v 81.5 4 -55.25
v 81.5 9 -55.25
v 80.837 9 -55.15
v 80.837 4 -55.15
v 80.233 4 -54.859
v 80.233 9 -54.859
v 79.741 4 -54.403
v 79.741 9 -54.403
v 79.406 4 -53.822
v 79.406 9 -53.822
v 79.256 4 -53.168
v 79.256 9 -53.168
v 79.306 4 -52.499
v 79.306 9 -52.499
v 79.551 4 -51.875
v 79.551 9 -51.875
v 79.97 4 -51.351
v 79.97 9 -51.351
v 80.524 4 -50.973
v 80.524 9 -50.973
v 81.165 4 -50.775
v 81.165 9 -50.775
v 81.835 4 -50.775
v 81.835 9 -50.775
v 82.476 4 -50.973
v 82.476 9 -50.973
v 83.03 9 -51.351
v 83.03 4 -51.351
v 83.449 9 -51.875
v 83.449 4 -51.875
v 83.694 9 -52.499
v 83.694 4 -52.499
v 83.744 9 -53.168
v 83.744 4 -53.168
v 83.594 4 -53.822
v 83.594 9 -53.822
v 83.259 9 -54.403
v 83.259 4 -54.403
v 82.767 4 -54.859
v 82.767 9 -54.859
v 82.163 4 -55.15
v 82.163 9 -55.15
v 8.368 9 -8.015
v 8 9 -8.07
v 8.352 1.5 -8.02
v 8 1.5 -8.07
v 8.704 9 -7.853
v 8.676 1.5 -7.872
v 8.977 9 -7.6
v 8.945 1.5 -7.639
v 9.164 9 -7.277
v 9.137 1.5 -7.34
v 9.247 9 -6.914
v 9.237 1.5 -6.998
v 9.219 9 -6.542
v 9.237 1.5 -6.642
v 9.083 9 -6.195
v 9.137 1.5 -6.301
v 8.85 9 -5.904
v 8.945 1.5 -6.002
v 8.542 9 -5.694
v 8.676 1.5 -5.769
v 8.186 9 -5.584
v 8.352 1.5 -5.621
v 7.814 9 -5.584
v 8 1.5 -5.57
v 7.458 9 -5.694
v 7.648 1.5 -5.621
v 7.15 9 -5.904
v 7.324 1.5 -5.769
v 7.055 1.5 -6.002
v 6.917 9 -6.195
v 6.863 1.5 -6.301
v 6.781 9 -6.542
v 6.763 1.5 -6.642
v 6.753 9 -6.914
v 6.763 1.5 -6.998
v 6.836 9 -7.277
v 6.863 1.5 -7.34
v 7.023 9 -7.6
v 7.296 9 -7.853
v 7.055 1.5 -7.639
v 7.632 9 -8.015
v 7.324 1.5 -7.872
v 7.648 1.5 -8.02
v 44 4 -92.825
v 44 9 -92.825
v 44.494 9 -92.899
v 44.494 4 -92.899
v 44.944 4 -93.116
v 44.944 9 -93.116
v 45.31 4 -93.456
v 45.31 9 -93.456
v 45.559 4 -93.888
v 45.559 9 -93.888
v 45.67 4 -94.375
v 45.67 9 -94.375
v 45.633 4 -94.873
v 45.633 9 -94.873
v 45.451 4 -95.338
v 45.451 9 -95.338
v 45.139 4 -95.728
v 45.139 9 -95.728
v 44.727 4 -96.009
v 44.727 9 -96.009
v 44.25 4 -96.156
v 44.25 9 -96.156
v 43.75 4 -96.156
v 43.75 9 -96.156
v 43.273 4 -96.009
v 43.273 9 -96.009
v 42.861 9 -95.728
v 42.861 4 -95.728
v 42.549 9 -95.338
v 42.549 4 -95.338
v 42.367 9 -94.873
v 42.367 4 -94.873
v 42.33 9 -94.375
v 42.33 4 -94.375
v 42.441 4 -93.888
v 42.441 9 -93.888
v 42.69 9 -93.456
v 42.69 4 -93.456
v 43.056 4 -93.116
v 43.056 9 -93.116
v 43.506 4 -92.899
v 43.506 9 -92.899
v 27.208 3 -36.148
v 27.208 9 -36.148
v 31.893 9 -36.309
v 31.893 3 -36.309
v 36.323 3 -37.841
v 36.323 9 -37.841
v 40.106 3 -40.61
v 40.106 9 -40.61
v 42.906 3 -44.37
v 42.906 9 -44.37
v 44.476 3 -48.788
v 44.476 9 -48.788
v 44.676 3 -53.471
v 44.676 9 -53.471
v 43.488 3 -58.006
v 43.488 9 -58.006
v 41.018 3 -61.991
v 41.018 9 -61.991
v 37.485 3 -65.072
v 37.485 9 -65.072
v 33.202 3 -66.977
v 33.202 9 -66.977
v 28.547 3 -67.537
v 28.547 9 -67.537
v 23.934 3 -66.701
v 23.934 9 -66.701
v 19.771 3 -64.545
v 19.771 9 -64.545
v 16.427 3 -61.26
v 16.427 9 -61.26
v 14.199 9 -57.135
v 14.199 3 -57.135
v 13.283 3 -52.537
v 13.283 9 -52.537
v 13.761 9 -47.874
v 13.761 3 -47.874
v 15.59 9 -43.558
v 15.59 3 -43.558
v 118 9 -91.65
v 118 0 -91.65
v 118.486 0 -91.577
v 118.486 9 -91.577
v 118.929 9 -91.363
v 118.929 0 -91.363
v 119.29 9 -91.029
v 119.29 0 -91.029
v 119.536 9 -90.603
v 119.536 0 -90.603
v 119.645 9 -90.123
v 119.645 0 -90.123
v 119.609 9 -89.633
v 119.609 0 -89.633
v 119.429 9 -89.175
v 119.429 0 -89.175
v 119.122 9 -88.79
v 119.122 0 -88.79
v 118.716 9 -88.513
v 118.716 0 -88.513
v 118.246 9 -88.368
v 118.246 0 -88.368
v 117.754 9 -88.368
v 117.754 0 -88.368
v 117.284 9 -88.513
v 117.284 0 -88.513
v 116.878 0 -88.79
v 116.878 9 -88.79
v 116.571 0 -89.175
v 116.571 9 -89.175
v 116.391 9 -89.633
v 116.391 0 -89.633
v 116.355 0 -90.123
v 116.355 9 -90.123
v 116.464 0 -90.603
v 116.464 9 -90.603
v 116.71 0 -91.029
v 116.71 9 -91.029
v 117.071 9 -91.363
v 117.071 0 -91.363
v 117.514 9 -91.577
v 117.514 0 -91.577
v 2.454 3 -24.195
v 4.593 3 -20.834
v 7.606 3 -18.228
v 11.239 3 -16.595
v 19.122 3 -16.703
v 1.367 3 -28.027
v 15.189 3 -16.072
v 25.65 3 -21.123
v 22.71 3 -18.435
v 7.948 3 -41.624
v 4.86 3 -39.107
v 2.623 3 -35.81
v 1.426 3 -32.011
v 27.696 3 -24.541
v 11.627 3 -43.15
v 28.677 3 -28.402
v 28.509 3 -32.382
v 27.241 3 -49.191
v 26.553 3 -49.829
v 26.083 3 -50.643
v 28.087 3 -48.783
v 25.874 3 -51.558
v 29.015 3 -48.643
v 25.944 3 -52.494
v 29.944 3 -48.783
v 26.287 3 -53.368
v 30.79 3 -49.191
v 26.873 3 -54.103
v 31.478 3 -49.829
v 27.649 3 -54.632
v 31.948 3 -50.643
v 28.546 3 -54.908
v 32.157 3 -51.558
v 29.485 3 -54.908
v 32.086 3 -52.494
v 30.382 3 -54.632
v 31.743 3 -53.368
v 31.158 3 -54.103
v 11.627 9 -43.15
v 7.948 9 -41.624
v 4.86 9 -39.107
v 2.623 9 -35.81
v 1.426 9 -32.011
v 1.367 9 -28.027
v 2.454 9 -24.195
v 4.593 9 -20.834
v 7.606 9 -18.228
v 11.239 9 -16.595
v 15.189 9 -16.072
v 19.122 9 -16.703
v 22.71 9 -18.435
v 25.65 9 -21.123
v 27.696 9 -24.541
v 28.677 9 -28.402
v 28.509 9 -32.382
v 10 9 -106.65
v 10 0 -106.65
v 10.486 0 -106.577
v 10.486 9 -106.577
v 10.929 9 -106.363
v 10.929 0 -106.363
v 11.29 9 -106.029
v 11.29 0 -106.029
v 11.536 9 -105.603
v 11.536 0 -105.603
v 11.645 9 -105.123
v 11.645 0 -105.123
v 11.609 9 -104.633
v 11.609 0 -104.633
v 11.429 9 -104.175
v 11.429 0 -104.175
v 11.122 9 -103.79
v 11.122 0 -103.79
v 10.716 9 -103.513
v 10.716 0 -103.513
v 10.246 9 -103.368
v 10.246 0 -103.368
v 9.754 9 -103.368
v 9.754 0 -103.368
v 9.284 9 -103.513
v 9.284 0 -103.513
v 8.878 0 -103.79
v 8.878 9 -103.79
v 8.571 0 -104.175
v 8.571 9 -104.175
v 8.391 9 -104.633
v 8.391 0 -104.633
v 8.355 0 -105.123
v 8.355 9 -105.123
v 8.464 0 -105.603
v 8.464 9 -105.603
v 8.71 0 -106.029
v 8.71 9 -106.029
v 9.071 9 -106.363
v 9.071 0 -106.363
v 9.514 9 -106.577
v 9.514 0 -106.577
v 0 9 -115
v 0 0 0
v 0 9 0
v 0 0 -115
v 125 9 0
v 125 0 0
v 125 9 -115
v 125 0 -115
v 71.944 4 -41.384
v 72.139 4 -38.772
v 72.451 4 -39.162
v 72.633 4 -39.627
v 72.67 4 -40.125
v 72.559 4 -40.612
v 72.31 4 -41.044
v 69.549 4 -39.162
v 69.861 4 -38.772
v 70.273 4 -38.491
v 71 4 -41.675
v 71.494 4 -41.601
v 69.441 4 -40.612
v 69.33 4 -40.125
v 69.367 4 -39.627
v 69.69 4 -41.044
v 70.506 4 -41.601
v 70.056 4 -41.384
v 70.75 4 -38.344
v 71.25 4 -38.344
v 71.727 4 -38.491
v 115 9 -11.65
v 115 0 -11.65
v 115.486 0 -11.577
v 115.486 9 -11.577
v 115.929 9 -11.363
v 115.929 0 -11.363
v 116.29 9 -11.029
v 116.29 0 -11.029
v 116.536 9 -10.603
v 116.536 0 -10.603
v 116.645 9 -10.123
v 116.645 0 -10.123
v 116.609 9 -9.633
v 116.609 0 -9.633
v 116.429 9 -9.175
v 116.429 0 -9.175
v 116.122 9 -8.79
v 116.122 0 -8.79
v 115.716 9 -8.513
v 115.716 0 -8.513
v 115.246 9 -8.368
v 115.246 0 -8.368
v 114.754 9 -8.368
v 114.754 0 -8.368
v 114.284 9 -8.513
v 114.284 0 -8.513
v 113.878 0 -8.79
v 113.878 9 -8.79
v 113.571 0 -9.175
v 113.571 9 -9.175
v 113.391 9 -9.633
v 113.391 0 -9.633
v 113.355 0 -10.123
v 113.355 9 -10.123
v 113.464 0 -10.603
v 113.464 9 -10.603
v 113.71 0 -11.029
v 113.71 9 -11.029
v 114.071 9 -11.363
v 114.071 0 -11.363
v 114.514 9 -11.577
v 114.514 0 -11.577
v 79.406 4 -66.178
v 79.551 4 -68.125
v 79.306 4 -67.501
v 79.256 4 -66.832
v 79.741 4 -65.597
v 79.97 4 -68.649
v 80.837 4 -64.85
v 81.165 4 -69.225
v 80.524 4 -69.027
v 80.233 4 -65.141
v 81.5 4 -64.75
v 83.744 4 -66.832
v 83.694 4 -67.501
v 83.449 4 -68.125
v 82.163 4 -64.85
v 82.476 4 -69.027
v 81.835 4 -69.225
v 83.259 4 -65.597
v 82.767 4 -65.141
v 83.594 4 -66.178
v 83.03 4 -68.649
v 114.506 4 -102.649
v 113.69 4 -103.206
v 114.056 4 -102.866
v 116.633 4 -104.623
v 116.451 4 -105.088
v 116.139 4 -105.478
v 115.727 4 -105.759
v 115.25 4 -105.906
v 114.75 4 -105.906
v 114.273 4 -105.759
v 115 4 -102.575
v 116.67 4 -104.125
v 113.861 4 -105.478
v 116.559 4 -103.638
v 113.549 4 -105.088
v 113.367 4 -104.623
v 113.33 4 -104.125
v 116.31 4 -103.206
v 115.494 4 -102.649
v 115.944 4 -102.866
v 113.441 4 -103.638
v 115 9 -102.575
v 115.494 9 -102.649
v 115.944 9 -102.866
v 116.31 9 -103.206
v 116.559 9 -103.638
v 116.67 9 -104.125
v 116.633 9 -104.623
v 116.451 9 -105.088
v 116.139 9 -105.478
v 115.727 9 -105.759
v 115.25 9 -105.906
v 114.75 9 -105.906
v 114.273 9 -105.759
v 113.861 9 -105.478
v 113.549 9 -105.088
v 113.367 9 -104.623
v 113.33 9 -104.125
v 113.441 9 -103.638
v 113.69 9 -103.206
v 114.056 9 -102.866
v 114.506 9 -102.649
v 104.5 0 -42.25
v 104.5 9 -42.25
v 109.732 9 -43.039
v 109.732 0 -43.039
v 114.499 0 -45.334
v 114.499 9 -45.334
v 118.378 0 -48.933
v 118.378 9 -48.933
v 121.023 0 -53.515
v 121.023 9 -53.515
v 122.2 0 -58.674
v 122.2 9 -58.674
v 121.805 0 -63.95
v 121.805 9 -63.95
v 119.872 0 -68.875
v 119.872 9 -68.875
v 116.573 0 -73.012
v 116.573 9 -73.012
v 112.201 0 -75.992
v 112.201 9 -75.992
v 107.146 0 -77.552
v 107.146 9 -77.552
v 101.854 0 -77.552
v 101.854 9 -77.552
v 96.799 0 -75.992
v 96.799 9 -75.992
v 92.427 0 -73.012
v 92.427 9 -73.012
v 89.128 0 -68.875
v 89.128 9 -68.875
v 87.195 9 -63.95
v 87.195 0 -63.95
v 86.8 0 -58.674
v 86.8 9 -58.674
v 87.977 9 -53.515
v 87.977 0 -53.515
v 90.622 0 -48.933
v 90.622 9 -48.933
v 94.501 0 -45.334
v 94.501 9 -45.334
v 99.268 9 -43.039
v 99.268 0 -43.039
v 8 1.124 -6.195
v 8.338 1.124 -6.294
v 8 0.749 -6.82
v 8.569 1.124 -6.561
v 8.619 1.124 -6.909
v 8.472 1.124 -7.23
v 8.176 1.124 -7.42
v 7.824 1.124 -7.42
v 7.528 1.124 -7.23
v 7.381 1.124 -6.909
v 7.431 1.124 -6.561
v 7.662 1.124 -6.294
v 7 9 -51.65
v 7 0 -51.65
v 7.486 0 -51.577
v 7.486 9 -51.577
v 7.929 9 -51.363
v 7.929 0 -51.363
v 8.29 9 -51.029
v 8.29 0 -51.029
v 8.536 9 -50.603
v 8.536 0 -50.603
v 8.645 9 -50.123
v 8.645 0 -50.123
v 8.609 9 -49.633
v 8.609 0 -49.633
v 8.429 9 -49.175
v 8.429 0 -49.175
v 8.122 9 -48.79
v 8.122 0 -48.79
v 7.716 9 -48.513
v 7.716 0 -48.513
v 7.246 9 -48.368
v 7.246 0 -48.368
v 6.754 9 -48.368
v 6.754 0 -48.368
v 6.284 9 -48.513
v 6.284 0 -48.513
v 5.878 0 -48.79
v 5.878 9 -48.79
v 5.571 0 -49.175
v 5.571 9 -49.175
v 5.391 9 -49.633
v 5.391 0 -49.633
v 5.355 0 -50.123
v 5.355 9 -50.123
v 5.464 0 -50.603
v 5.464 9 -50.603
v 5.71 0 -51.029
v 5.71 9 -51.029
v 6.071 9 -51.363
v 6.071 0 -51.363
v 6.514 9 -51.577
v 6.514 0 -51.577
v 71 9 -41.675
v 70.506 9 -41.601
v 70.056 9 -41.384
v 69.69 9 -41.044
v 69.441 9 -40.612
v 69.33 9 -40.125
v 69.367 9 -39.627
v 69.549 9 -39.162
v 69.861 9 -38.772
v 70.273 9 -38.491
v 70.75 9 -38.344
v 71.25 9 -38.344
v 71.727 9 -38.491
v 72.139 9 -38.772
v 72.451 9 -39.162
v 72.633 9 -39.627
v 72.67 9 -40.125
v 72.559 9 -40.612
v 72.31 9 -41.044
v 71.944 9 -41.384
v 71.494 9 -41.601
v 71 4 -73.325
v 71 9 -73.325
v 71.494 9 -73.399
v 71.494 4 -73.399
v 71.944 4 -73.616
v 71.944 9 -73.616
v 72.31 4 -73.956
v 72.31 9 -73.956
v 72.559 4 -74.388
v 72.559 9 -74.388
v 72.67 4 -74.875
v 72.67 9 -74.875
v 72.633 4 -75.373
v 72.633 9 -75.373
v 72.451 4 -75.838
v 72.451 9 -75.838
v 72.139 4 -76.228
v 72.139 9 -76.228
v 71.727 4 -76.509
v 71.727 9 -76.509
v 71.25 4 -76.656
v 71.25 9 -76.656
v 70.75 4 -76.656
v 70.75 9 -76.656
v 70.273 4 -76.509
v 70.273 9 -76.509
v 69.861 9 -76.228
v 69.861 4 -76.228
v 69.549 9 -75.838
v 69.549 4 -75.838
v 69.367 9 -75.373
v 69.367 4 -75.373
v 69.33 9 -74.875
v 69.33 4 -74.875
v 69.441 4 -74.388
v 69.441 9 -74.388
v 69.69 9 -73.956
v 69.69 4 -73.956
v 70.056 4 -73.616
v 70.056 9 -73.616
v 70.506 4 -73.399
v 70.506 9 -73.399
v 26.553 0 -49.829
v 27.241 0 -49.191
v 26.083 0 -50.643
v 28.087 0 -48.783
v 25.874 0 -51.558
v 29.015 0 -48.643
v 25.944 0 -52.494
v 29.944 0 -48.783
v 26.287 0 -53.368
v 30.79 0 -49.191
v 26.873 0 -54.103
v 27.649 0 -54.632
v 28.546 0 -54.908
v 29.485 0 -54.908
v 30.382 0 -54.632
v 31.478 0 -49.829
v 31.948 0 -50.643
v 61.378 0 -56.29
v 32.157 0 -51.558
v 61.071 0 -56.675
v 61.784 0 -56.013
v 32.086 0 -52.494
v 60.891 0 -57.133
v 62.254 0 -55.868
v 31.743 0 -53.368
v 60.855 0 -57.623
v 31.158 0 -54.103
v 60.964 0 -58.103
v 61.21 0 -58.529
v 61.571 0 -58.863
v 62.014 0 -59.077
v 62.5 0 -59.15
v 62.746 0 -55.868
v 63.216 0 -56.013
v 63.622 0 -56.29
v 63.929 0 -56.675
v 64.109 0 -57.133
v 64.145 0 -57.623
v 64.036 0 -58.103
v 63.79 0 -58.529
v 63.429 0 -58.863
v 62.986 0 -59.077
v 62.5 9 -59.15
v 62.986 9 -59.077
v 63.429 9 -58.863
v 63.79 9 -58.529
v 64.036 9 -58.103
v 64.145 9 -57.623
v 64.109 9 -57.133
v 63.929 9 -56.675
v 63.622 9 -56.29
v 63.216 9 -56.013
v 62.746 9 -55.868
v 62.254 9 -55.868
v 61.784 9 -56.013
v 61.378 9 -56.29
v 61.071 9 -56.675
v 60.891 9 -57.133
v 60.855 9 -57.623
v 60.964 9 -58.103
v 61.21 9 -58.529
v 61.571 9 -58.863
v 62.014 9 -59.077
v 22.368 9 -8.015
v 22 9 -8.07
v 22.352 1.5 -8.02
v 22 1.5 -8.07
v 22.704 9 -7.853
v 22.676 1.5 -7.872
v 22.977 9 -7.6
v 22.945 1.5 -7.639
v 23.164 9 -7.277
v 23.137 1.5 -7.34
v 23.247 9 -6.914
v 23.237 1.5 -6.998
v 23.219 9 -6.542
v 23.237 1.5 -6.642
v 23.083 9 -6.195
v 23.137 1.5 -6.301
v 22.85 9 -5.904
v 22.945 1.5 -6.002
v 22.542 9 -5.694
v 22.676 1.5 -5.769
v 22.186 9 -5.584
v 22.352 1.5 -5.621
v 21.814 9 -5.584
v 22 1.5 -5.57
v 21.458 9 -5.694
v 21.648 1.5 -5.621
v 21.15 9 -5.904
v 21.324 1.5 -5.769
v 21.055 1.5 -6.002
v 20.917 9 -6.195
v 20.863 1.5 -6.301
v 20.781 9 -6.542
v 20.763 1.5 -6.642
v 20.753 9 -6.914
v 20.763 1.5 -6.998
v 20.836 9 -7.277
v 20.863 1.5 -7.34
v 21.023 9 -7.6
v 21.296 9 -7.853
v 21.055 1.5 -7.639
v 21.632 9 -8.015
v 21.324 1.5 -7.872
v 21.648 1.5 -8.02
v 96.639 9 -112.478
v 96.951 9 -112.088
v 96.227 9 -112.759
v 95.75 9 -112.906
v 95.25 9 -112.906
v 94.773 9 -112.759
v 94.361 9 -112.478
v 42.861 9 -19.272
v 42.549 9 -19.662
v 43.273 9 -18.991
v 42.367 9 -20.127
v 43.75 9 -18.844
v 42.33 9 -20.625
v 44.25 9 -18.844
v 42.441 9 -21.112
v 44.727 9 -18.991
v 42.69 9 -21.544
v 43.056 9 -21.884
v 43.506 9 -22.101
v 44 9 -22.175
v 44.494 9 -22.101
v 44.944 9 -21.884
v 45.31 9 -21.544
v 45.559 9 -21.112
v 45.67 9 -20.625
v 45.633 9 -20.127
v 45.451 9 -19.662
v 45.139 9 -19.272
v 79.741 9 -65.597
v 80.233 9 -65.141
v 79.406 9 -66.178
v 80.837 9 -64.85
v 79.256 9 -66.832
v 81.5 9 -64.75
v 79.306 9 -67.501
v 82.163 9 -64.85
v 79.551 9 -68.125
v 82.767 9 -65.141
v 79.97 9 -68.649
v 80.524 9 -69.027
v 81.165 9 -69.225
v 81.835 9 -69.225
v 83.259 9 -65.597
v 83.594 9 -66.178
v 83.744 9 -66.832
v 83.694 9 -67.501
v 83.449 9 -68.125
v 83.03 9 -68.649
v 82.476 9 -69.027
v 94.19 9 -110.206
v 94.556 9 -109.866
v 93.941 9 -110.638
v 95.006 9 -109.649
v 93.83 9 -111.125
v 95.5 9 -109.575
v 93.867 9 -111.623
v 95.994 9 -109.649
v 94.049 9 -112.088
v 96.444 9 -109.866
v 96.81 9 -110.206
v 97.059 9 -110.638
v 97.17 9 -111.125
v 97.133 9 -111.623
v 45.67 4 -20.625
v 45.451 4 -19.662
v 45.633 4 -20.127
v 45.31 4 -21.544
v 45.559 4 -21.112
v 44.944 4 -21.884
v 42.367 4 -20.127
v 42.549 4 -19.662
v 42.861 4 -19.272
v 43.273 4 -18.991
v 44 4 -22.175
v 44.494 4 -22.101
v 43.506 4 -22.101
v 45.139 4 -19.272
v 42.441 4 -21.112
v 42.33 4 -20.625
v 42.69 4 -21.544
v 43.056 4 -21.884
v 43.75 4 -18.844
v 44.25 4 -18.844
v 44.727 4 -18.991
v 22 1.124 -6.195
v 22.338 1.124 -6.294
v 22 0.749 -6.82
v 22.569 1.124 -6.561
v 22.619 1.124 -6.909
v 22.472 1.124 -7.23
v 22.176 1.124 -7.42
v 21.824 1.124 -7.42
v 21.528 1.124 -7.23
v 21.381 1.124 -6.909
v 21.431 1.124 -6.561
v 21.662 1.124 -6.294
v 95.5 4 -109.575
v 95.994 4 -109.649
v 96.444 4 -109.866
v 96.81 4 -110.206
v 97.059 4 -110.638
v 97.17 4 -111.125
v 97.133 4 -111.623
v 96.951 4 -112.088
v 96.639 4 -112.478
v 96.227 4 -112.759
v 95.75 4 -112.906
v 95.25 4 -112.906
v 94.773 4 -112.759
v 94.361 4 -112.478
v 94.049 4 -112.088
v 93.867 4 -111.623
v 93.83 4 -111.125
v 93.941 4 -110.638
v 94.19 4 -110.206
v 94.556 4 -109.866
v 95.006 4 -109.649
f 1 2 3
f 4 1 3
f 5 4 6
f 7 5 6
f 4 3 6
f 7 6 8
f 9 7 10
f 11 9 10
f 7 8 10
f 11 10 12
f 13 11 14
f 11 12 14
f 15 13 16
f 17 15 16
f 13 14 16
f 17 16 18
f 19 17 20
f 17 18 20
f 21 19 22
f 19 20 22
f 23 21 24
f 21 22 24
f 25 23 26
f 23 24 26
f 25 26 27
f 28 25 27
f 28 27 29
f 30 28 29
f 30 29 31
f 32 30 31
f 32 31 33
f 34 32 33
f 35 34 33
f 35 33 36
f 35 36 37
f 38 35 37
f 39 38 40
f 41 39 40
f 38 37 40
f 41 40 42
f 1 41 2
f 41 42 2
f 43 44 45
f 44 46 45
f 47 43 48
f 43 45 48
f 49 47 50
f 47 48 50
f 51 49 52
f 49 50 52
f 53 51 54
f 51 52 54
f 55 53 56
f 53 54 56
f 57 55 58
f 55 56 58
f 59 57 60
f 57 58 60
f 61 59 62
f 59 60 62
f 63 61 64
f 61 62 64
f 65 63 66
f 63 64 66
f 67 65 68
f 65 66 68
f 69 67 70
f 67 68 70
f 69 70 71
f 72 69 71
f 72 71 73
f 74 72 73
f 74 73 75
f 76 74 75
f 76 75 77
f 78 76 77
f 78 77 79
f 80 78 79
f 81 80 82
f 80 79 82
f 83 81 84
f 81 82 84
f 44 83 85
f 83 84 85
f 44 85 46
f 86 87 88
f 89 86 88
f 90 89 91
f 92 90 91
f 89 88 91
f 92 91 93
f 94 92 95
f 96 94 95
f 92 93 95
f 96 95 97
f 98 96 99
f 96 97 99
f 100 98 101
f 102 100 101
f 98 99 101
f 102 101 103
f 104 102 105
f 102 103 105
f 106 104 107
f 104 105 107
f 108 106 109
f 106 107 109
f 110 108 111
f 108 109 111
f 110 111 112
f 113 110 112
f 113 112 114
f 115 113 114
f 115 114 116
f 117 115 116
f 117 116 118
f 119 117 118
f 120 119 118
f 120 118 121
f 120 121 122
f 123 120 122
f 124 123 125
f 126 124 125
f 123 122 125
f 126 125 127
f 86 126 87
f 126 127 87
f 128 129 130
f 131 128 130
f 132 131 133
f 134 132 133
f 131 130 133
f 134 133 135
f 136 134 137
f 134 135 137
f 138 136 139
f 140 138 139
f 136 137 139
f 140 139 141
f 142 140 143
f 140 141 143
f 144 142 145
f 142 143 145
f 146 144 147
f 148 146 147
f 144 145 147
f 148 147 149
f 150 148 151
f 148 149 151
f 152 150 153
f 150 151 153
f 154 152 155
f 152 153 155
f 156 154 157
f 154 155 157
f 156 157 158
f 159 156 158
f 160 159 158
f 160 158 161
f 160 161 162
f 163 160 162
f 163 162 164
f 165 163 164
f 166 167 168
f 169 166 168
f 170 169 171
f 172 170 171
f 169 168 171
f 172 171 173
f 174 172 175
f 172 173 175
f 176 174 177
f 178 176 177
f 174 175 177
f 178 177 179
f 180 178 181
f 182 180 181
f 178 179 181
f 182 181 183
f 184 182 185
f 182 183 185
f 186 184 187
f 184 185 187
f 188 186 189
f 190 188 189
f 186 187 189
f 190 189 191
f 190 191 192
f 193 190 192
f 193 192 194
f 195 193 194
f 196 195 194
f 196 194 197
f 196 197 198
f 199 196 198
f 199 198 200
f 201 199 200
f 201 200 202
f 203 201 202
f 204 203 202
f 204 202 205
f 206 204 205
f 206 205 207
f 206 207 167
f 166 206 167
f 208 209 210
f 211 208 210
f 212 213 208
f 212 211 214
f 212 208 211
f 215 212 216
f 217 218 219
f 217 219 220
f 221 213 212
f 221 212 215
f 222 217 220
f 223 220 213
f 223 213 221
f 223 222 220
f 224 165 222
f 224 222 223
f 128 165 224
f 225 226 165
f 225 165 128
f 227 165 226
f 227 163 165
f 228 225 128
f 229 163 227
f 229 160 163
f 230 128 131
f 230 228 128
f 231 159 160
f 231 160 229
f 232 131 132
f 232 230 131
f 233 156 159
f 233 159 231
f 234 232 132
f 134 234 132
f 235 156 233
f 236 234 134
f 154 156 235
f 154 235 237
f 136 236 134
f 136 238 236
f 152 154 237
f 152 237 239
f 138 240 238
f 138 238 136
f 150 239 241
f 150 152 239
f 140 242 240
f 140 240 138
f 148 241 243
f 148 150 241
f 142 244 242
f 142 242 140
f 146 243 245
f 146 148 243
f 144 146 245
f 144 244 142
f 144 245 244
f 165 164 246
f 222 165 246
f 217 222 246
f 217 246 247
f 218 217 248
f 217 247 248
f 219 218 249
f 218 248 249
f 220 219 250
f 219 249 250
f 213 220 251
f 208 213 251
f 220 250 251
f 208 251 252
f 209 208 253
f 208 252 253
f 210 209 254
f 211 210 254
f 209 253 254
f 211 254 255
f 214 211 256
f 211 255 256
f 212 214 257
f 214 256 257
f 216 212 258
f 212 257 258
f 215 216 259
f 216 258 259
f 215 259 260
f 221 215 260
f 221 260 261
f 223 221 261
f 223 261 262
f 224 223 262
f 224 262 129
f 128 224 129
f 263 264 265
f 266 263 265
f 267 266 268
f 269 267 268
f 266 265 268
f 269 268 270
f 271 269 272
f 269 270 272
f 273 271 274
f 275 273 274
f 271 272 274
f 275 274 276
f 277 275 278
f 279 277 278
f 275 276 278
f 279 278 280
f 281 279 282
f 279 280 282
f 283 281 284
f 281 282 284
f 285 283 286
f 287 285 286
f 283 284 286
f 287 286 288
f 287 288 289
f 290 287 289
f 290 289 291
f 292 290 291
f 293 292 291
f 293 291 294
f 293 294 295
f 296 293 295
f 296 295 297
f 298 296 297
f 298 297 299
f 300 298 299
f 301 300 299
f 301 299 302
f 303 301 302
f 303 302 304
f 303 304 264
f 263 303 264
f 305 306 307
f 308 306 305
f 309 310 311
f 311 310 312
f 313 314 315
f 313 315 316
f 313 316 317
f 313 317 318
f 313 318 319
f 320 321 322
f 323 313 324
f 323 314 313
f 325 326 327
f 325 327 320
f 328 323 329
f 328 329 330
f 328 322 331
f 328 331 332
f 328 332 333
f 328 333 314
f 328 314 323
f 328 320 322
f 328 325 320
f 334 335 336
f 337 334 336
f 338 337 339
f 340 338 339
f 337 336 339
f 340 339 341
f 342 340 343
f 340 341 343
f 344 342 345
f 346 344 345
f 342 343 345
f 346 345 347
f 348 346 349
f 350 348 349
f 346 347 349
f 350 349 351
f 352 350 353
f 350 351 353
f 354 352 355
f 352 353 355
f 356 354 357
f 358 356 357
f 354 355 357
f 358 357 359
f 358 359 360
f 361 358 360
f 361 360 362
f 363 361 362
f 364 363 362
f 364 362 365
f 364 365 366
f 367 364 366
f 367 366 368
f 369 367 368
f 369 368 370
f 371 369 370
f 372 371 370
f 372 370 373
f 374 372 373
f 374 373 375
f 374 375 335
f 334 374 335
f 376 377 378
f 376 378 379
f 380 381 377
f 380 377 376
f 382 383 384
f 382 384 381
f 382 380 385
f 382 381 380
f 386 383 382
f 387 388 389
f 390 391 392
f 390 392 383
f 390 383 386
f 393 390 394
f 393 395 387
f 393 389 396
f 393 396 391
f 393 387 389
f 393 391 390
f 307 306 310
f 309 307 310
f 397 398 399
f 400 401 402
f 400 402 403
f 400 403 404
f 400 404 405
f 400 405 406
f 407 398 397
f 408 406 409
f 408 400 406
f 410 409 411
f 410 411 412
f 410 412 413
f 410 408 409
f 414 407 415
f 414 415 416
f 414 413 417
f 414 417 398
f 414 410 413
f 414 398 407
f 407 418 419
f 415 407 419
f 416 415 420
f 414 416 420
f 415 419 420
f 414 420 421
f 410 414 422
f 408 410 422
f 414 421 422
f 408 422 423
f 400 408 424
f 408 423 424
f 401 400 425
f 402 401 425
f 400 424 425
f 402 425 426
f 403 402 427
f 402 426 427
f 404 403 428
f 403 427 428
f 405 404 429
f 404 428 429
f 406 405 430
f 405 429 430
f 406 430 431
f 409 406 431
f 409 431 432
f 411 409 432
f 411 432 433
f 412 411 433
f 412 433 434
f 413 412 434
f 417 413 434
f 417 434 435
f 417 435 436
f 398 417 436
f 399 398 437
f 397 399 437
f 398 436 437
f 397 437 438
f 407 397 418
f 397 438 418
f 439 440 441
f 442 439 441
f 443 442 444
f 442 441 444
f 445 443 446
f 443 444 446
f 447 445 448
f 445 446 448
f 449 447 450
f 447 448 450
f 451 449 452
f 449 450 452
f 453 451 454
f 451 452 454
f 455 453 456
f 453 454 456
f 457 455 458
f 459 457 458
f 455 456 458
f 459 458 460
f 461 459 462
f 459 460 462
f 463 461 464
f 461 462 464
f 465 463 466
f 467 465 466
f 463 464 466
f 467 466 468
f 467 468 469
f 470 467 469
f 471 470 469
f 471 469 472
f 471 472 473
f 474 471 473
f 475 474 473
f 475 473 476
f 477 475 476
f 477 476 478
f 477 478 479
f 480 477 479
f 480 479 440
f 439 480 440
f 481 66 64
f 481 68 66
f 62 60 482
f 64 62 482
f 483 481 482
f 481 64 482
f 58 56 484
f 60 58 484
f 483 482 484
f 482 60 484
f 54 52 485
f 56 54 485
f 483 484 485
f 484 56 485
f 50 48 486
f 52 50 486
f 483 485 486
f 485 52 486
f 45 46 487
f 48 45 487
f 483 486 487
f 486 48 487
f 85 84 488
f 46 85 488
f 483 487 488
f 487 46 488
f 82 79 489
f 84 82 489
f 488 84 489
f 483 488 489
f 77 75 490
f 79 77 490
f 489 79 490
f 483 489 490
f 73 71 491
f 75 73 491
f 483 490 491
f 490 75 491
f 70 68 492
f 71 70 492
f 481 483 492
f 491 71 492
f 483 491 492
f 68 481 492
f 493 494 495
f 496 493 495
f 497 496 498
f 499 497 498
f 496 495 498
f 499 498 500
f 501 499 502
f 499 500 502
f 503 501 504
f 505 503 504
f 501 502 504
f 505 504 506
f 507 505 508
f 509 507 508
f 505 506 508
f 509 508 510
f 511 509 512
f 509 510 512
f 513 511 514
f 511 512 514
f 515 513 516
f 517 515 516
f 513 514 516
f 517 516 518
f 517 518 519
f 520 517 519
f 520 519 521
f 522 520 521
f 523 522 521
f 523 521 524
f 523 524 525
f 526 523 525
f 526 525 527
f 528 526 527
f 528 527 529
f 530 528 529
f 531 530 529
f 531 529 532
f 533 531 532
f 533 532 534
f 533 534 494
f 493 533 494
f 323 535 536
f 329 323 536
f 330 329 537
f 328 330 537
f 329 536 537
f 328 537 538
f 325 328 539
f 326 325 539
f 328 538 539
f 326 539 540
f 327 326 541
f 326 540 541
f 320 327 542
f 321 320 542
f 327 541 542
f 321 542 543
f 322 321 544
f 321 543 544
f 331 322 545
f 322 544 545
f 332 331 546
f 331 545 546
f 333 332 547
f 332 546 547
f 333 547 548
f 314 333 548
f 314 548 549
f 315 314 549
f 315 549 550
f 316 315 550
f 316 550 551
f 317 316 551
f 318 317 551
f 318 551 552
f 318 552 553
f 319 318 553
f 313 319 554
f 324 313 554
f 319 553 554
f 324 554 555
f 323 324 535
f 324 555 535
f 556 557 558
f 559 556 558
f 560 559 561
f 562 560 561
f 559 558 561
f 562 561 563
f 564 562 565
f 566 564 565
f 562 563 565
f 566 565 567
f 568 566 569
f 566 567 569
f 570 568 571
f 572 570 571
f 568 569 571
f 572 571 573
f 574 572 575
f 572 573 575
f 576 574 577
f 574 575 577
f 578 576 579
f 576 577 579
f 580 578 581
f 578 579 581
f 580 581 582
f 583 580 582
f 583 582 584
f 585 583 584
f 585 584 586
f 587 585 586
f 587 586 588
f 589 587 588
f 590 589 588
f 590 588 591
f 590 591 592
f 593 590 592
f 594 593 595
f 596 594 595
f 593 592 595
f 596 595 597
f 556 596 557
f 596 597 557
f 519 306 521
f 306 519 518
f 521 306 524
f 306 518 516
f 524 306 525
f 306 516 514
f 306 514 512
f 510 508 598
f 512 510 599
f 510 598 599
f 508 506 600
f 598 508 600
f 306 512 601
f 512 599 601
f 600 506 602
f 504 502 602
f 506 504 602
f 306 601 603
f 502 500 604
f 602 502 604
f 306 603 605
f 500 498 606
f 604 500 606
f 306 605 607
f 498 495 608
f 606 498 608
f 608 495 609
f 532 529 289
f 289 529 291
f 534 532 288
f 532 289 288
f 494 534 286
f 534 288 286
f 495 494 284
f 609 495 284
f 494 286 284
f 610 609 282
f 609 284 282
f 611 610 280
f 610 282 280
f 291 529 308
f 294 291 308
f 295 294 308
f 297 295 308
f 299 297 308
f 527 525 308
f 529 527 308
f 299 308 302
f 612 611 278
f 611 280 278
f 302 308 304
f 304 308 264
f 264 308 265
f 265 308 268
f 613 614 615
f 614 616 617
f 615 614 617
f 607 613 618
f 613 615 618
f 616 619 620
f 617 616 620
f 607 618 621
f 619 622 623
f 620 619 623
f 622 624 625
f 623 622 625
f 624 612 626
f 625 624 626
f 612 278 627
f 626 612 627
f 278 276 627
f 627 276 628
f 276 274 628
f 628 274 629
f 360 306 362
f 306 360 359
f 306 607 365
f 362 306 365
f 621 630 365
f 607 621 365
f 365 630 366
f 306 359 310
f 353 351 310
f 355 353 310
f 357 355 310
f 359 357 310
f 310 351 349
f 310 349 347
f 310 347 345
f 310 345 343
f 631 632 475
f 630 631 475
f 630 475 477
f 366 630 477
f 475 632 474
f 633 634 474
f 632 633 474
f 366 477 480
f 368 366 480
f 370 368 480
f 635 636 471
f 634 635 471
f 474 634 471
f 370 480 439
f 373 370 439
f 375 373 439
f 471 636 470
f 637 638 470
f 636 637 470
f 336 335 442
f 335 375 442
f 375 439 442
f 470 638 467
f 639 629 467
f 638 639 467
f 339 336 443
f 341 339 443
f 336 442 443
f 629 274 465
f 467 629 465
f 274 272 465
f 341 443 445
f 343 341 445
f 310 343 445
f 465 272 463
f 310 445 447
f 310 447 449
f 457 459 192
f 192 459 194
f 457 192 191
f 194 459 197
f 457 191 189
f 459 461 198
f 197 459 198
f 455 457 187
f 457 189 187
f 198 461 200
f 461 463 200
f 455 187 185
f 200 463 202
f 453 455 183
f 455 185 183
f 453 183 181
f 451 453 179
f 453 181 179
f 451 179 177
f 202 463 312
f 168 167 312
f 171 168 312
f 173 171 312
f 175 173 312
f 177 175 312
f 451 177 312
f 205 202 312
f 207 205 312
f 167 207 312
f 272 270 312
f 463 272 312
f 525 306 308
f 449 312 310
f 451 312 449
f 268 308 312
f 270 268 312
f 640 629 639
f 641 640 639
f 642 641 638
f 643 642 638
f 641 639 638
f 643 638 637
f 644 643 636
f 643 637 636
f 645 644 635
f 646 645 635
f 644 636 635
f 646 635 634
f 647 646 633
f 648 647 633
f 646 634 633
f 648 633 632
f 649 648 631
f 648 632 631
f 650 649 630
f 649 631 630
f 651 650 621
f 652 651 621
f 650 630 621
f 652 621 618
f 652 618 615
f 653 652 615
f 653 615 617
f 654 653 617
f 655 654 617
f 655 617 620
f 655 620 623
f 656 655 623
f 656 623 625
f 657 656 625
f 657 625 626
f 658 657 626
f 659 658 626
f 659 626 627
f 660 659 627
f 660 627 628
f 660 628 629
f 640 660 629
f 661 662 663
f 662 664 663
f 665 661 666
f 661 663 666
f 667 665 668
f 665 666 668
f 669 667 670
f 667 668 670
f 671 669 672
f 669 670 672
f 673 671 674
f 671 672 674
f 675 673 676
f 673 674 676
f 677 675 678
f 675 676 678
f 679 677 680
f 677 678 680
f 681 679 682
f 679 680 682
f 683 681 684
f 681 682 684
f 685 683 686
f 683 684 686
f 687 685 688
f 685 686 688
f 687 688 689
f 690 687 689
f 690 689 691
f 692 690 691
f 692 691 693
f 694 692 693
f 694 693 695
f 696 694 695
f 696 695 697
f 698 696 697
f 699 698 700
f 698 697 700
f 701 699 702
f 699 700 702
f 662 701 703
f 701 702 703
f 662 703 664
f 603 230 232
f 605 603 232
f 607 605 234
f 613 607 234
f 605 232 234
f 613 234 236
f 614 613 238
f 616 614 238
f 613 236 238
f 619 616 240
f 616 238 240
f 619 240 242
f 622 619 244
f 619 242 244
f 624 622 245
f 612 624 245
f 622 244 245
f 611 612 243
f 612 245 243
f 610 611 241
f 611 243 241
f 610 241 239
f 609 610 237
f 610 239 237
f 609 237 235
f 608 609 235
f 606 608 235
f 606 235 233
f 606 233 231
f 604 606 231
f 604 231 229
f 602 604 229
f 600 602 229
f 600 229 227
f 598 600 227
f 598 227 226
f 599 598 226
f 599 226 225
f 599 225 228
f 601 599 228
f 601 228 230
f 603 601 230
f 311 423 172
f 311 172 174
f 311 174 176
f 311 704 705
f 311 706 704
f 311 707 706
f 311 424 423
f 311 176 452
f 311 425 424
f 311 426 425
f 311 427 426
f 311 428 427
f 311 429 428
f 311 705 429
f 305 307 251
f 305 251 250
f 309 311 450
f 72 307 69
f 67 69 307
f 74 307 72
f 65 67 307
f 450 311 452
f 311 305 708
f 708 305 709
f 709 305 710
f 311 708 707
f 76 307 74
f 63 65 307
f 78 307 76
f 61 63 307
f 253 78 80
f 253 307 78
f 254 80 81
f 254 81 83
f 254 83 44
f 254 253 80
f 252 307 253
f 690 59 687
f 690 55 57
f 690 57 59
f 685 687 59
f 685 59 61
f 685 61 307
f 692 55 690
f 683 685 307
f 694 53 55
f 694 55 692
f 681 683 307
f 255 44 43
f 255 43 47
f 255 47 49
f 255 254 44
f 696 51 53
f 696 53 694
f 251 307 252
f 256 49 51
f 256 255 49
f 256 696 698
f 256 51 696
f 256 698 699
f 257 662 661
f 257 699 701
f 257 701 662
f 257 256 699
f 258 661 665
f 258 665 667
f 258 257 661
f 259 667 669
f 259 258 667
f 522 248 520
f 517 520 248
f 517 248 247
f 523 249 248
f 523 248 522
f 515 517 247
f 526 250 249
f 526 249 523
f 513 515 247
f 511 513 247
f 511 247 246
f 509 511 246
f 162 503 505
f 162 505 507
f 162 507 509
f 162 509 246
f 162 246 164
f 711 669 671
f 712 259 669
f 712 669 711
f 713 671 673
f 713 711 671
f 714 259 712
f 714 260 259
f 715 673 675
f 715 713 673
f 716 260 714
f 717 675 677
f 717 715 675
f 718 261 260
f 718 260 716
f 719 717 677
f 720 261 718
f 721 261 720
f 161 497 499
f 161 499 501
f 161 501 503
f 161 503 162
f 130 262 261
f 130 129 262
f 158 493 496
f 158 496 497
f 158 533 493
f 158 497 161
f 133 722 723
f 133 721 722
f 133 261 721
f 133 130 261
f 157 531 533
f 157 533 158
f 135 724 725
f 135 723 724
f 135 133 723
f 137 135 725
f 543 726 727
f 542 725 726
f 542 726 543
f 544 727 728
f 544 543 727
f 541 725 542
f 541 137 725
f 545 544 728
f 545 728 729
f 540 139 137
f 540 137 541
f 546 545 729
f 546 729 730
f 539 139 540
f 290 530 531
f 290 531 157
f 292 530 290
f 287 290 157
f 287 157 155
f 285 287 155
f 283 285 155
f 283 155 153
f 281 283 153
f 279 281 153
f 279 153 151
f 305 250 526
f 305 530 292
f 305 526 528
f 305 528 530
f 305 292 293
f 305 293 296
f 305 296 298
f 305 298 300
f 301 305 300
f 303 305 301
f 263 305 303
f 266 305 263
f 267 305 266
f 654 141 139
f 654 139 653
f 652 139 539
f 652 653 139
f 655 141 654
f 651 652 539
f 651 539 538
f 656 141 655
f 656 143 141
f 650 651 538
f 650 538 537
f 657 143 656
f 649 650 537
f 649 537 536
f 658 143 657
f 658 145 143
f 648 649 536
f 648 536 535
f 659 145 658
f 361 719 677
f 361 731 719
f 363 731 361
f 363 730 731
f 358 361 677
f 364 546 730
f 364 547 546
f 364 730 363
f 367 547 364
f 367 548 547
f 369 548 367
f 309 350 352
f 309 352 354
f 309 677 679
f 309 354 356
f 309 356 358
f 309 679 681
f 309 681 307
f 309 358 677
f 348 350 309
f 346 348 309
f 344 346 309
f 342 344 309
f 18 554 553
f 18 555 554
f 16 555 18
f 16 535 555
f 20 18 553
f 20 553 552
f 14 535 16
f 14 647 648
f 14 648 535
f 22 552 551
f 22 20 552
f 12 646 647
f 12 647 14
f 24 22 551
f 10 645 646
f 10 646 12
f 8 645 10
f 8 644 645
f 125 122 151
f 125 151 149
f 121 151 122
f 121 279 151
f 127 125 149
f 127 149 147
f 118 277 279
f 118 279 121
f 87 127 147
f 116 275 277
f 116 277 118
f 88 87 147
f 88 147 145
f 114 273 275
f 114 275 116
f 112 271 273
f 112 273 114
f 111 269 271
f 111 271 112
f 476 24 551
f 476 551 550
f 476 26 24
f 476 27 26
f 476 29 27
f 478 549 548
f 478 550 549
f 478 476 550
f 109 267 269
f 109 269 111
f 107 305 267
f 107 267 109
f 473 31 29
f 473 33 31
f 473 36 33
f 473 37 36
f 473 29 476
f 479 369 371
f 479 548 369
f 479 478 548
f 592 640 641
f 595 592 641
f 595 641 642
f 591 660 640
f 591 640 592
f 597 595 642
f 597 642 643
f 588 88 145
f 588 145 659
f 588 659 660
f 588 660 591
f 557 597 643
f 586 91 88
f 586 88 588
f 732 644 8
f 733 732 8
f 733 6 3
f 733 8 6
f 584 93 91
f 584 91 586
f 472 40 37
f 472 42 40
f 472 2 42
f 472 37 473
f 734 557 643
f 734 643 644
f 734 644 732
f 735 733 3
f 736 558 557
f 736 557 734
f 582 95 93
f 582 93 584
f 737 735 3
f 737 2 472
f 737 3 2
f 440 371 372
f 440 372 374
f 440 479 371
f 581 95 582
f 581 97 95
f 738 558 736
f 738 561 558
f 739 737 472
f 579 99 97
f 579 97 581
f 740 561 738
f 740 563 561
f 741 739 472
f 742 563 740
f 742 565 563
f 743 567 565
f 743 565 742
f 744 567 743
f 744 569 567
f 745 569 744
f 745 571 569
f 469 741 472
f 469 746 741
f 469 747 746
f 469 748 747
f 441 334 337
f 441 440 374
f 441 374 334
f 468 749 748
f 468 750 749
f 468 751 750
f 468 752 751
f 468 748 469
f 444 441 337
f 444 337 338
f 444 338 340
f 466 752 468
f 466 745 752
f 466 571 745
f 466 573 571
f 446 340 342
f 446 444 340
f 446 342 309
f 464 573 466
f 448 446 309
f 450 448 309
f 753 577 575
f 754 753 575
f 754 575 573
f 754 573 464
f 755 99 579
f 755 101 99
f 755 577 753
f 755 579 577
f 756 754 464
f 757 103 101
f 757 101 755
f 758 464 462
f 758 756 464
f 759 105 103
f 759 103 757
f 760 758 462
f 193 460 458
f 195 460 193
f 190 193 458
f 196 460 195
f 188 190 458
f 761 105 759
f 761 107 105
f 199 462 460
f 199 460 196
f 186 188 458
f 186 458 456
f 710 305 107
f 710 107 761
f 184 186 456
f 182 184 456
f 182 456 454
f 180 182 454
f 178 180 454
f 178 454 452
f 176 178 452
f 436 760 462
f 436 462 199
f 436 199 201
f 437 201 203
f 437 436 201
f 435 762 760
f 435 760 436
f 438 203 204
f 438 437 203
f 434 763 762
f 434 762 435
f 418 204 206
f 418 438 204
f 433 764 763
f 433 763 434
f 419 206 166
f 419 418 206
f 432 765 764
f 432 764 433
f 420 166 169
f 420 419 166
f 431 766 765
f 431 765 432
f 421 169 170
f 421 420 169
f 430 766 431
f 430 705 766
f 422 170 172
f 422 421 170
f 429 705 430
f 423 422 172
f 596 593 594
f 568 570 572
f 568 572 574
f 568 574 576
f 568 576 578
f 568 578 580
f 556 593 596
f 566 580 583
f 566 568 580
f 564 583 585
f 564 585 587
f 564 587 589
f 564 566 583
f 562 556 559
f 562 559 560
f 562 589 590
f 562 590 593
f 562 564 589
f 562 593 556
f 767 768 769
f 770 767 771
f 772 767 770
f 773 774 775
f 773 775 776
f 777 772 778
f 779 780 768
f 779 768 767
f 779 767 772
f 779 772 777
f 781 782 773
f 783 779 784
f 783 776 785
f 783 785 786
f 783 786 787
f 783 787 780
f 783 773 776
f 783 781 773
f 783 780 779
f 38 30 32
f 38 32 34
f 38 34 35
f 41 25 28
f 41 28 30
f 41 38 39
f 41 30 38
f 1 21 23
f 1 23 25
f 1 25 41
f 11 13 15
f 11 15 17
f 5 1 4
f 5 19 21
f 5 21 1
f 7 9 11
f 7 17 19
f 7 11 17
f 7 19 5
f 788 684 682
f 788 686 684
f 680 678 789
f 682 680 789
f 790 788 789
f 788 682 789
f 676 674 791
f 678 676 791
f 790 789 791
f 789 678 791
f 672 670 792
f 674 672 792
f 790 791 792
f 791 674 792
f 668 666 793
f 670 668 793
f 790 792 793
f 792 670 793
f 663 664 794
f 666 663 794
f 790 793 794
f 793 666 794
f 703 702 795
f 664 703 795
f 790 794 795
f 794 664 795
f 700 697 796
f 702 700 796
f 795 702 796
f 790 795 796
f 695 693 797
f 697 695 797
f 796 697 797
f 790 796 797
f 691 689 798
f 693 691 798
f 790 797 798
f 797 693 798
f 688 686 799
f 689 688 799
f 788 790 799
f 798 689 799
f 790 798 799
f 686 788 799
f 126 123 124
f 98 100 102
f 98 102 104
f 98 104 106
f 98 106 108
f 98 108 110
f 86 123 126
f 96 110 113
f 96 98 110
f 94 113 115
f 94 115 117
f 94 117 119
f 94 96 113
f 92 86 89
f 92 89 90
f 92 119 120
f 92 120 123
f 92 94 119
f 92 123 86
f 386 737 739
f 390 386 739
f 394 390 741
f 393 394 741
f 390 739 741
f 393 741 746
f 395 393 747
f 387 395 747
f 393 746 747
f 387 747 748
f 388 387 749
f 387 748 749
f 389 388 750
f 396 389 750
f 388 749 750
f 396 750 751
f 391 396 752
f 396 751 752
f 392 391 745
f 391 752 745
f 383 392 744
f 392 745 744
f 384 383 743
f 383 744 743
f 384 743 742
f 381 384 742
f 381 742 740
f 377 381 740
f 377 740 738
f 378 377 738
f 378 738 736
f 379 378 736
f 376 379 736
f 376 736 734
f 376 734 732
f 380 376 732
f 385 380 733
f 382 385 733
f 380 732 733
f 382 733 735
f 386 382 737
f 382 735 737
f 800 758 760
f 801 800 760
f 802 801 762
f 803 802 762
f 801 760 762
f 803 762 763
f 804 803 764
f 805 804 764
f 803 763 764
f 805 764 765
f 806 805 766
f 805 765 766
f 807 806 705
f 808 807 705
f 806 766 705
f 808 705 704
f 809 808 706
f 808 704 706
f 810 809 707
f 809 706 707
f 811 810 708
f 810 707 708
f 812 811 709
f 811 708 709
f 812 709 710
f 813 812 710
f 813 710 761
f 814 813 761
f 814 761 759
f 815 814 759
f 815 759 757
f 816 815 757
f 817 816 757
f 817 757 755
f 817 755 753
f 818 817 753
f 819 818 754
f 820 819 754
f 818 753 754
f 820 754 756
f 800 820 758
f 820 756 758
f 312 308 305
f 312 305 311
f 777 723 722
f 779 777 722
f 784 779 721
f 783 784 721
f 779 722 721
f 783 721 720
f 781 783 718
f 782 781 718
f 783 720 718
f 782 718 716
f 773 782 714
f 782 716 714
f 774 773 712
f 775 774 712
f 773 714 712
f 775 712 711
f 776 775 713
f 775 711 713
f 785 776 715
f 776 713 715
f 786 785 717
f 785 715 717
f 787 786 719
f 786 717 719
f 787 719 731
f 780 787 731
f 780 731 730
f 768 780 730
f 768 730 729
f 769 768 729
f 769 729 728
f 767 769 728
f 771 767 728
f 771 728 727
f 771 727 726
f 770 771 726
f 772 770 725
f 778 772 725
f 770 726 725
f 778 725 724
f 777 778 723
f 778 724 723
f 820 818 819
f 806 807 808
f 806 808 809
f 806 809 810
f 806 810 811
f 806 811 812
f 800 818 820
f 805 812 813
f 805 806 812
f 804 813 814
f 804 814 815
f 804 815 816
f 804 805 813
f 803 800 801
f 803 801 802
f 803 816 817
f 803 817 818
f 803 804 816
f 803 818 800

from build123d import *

# Parameters (mm, degrees)
SKETCH1_W                 = 125
SKETCH1_H                 = 115
TOP_BASE_DEPTH            = 9
SKETCH5_R                 = 15.75
SKETCH5_R_2               = 13.75
GEARS_EXTRUDE_CUT_DEPTH   = 6
SKETCH7_R                 = 3.15
KEY_EXTRUDE_CUT_DEPTH     = 171.091152033
SKETCH8_R                 = 17.75
THUMB_EXTRUDE_CUT_DEPTH   = 171.091152033
SKETCH9_R                 = 1.675
SKETCH9_R_2               = 2.25
MOUNT_HOLES_DEPTH         = 5
M3X0_5_TAPPED_HOLE1_D     = 2.5
M3X0_5_TAPPED_HOLE1_DEPTH = 7.5
M3X0_5_TAPPED_HOLE1_TIP   = 0.751075774
M4X0_7_TAPPED_HOLE1_D     = 3.3
M4X0_7_TAPPED_HOLE1_DEPTH = 10.1
M4X0_7_TAPPED_HOLE1_TIP   = 0.991420021


with BuildPart() as part:
    # Sketch1 → Top_Base (new body)
    with BuildSketch(Plane(origin=(0, 0, 0), x_dir=(1, 0, 0), z_dir=(0, 1, 0))):
        with Locations((62.5, 57.5)):
            Rectangle(SKETCH1_W, SKETCH1_H)
    extrude(amount=TOP_BASE_DEPTH)

    # Sketch5 → Gears_Extrude_Cut (cut)
    with BuildSketch(Plane(origin=(0, 9, 0), x_dir=(1, 0, 0), z_dir=(0, 1, 0))):
        with Locations((29.01540546, 51.79347369)):
            Circle(SKETCH5_R)
        with Locations((15, 29.820255536)):
            Circle(SKETCH5_R_2)
    extrude(amount=-GEARS_EXTRUDE_CUT_DEPTH, mode=Mode.SUBTRACT)

    # Sketch7 → Key_Extrude_Cut (cut, through all)
    with BuildSketch(Plane(origin=(0, 9, 0), x_dir=(1, 0, 0), z_dir=(0, 1, 0))):
        with Locations(Location((29.01540546, 51.79347369, 0), (0, 0, 270))):
            Circle(SKETCH7_R)
    extrude(amount=-KEY_EXTRUDE_CUT_DEPTH, mode=Mode.SUBTRACT)

    # Sketch8 → Thumb_Extrude_Cut (cut, through all)
    with BuildSketch(Plane(origin=(0, 9, 0), x_dir=(1, 0, 0), z_dir=(0, 1, 0))):
        with Locations(Location((104.5, 60, 0), (0, 0, 270))):
            Circle(SKETCH8_R)
    extrude(amount=-THUMB_EXTRUDE_CUT_DEPTH, mode=Mode.SUBTRACT)

    # Sketch9 → Mount_Holes (cut)
    with BuildSketch(Plane(origin=(0, 9, 0), x_dir=(1, 0, 0), z_dir=(0, 1, 0))):
        with Locations(Location((71, 75, 0), (0, 0, 270))):
            Circle(SKETCH9_R)
        with Locations(Location((44, 94.5, 0), (0, 0, 270))):
            Circle(SKETCH9_R)
        with Locations(Location((81.5, 67, 0), (0, 0, 270))):
            Circle(SKETCH9_R_2)
        with Locations(Location((95.5, 111.25, 0), (0, 0, 270))):
            Circle(SKETCH9_R)
        with Locations(Location((115, 104.25, 0), (0, 0, 270))):
            Circle(SKETCH9_R)
        with Locations(Location((71, 40, 0), (0, 0, 90))):
            Circle(SKETCH9_R)
        with Locations(Location((44, 20.5, 0), (0, 0, 90))):
            Circle(SKETCH9_R)
        with Locations(Location((81.5, 53, 0), (0, 0, 90))):
            Circle(SKETCH9_R_2)
    extrude(amount=-MOUNT_HOLES_DEPTH, mode=Mode.SUBTRACT)

    # M3x0.5 Tapped Hole1
    with Locations(Plane(origin=(8, 9, -6.820255536), x_dir=(0, 0, 1), z_dir=(0, 1, 0))):
        with Locations((0, 0), (0, 14)):
            Hole(M3X0_5_TAPPED_HOLE1_D / 2, depth=M3X0_5_TAPPED_HOLE1_DEPTH)
            with Locations((0, 0, -(M3X0_5_TAPPED_HOLE1_DEPTH + M3X0_5_TAPPED_HOLE1_TIP / 2))):  # 118° drill point
                Cone(0, M3X0_5_TAPPED_HOLE1_D / 2, M3X0_5_TAPPED_HOLE1_TIP, mode=Mode.SUBTRACT)

    # M4x0.7 Tapped Hole1
    with Locations(Plane(origin=(10, 9, -105), x_dir=(0, 0, 1), z_dir=(0, 1, 0))):
        with Locations((0, 0), (15, 108), (95, 105), (55, -3), (47.5, 52.5)):
            Hole(M4X0_7_TAPPED_HOLE1_D / 2, depth=M4X0_7_TAPPED_HOLE1_DEPTH)
            with Locations((0, 0, -(M4X0_7_TAPPED_HOLE1_DEPTH + M4X0_7_TAPPED_HOLE1_TIP / 2))):  # 118° drill point
                Cone(0, M4X0_7_TAPPED_HOLE1_D / 2, M4X0_7_TAPPED_HOLE1_TIP, mode=Mode.SUBTRACT)


solid = part.part
